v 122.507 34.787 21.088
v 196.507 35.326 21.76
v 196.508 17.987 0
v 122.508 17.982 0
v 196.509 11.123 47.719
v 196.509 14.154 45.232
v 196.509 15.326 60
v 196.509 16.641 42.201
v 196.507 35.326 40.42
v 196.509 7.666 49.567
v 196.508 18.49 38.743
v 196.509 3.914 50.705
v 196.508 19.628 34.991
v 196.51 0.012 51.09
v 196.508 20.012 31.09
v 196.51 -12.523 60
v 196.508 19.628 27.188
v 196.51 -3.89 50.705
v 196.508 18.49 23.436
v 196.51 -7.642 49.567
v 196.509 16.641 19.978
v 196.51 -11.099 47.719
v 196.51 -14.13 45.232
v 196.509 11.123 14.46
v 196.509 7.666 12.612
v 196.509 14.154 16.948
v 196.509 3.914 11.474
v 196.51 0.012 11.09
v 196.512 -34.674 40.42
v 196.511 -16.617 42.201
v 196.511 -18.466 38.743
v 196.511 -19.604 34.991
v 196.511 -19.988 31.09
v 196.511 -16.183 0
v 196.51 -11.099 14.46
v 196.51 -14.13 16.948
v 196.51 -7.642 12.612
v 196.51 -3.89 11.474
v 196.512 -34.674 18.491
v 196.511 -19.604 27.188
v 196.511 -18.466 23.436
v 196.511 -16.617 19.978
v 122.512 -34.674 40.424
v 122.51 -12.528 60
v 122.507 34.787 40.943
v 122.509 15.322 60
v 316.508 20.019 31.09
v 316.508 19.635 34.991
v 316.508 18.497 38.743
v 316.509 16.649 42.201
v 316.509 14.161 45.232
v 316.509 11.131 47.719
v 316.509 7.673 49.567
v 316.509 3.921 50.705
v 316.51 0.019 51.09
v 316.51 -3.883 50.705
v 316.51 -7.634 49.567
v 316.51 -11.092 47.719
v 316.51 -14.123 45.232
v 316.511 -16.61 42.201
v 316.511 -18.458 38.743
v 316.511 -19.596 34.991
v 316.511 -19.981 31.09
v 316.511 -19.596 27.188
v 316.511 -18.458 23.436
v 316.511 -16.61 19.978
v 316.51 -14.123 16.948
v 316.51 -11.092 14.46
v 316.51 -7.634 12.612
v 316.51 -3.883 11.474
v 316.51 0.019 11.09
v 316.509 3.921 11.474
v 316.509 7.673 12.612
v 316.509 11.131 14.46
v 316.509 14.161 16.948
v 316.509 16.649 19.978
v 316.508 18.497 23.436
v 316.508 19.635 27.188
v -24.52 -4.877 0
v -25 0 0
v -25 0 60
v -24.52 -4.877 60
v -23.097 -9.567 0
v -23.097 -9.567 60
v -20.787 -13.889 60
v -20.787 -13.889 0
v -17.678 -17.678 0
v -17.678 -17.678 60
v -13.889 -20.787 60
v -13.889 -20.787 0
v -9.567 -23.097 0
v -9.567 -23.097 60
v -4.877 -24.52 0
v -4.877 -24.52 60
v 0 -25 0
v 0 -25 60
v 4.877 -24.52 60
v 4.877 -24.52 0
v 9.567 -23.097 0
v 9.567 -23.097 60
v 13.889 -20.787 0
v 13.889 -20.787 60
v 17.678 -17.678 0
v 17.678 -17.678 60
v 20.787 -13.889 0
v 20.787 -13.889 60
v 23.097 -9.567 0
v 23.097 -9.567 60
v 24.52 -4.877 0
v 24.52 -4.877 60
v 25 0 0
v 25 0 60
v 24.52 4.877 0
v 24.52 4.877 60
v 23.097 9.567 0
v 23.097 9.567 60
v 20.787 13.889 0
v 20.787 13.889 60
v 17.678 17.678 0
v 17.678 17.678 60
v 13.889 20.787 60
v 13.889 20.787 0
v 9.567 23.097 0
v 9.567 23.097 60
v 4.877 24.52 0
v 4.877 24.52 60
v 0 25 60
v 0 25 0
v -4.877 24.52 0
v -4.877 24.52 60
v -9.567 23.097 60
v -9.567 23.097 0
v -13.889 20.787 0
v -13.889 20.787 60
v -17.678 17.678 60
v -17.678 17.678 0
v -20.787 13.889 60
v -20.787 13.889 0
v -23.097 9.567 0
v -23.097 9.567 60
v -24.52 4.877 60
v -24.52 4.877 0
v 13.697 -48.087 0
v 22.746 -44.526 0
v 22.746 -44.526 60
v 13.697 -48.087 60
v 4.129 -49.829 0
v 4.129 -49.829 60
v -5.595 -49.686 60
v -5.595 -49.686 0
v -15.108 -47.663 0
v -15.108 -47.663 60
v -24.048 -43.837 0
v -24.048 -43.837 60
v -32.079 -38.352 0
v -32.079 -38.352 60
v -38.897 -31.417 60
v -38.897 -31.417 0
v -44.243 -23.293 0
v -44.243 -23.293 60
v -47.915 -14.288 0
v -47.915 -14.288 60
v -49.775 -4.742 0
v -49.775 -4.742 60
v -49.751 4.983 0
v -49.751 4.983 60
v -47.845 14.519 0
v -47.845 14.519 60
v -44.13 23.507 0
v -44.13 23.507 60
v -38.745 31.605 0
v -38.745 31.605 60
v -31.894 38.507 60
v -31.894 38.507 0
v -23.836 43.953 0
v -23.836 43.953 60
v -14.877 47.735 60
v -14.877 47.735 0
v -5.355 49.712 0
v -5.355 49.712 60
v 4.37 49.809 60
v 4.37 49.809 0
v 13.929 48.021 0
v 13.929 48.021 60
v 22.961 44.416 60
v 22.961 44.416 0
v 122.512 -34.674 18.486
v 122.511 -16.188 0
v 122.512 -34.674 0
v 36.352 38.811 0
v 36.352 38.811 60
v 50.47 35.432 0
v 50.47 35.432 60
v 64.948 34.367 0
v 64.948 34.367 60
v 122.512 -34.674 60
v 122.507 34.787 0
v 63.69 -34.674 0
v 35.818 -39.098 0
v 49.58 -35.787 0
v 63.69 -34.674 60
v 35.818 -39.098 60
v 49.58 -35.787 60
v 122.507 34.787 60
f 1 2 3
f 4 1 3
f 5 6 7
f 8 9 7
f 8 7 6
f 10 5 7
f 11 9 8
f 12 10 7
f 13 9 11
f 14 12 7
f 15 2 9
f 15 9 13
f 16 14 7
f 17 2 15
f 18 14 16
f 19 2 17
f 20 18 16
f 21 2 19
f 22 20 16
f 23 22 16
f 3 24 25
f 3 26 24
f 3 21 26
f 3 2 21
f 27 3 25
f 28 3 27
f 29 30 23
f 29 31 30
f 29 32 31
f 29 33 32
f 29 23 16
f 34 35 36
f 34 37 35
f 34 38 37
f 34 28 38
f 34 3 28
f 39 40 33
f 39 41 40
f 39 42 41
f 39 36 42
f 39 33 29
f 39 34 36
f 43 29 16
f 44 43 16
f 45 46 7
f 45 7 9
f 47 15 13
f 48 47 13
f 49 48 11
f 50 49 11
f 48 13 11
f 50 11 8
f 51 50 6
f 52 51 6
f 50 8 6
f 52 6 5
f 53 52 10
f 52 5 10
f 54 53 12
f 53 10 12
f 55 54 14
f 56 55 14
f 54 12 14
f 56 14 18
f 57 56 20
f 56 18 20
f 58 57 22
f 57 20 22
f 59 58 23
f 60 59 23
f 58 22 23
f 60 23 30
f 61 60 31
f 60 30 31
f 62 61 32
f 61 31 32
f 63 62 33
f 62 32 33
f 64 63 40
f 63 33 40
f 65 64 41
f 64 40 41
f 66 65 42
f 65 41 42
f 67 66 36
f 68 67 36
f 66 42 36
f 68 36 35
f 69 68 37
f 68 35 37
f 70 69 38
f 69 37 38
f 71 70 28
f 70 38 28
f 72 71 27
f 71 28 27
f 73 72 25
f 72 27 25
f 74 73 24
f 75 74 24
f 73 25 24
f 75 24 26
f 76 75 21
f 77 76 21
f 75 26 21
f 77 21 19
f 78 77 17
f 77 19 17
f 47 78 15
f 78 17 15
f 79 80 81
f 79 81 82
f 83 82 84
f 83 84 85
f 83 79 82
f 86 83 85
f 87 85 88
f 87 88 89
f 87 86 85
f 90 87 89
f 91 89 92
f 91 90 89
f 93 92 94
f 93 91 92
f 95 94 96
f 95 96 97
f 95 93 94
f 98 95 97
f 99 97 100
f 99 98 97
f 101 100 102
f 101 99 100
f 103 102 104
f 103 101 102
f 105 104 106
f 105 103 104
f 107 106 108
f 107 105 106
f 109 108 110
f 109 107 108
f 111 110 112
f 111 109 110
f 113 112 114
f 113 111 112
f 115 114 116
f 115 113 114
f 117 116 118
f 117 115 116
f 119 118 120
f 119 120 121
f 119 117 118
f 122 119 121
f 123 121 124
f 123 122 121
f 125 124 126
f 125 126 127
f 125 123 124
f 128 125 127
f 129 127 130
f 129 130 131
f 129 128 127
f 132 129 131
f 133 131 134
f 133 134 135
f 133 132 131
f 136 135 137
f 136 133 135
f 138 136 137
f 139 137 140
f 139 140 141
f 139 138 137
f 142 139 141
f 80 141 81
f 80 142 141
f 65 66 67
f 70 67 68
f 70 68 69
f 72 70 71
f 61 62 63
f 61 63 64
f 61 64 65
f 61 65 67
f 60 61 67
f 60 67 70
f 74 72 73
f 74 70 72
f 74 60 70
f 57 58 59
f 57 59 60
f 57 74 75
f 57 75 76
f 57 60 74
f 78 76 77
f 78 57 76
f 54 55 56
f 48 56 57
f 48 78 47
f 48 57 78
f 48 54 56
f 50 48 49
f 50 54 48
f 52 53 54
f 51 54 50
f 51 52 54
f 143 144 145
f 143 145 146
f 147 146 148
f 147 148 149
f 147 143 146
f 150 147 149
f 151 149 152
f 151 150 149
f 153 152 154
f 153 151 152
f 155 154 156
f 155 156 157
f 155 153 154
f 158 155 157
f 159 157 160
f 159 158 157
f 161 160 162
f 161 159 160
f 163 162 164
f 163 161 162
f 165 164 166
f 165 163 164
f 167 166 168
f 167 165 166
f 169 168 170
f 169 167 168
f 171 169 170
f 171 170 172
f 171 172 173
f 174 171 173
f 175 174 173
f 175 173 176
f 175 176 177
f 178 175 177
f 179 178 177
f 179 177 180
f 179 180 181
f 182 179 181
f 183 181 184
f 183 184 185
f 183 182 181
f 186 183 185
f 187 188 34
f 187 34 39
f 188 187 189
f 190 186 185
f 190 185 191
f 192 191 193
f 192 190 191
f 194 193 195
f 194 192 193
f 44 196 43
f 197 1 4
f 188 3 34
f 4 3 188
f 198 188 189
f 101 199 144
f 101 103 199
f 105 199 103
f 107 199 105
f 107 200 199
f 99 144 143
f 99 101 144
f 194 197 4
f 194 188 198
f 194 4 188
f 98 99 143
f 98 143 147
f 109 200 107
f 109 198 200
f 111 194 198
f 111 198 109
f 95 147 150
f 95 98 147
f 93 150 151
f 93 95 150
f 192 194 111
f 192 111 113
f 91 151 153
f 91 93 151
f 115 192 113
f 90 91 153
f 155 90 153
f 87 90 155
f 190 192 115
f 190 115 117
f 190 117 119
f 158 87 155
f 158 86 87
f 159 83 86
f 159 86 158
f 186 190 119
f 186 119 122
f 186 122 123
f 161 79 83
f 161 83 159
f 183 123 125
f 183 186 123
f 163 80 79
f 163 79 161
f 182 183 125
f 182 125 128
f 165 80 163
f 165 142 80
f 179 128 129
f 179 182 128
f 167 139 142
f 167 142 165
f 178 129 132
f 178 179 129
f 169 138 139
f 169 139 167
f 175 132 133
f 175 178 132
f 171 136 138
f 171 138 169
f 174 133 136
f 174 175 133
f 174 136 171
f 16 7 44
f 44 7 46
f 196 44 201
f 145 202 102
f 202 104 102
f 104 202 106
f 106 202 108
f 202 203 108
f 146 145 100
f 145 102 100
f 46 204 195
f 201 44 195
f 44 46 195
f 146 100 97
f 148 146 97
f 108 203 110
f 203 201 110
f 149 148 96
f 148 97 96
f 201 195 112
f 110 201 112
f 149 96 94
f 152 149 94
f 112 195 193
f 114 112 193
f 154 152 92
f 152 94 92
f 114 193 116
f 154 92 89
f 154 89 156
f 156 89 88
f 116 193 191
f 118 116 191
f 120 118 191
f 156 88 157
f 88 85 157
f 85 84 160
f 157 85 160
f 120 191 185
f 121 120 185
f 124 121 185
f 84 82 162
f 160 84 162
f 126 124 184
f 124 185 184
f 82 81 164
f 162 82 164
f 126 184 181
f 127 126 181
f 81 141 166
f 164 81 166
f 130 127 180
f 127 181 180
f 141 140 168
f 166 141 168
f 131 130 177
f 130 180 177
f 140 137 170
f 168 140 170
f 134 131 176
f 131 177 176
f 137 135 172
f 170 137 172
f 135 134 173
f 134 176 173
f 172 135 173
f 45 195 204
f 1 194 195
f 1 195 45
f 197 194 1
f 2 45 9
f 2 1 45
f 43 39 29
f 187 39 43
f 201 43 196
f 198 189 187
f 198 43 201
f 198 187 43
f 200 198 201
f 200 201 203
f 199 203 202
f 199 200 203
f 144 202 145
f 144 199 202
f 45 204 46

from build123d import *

# Parameters (mm, degrees)
SKETCH1_R           = 25
BOSS_EXTRUDE1_DEPTH = 60
CUT_EXTRUDE1_DEPTH  = 74
SKETCH3_R           = 20
BOSS_EXTRUDE2_DEPTH = 120


with BuildPart() as part:
    # Sketch1 → Boss-Extrude1 (new body)
    with BuildSketch(Plane.XY):
        with BuildLine():
            Line((64.94754869, 34.367143049), (196.507423933, 35.326035965))
            Line((196.507423933, 35.326035965), (196.511673709, -34.673963906))
            Line((196.511673709, -34.673963906), (63.689894991, -34.673963906))
            ThreePointArc((63.689894991, -34.673963906), (42.633771657, -37.171737248), (22.746391068, -44.526415681))
            ThreePointArc((22.746391068, -44.526415681), (-49.999854067, 0.120802809), (22.961281527, 44.415983054))
            ThreePointArc((22.961281527, 44.415983054), (43.342950879, 36.836730802), (64.94754869, 34.367143049))
        make_face()
        with Locations(Location((0, 0, 0), (0, 0, 180))):
            Circle(SKETCH1_R, mode=Mode.SUBTRACT)
    extrude(amount=BOSS_EXTRUDE1_DEPTH)

    # Sketch2 → Cut-Extrude1 (cut)
    with BuildSketch(Plane(origin=(196.509567891, 0.011930308, 0), x_dir=(0, 0, -1), z_dir=(0.9999999981570824, 6.0711079910172726e-05, 0))):
        Polygon((-60, 15.314105722), (-40.419671978, 35.314105722), (-60, 35.314105722), align=None)
        Polygon((0, 35.314105722), (-21.759605821, 35.314105722), (0, 17.974594403), align=None)
        Polygon((-40.419671978, -34.685894278), (-60, -12.535294787), (-60, -34.685894278), align=None)
        Polygon((0, -34.685894278), (0, -16.195205155), (-18.490689122, -34.685894278), align=None)
    extrude(amount=-CUT_EXTRUDE1_DEPTH, mode=Mode.SUBTRACT)

    # Sketch3 → Boss-Extrude2 (add)
    with BuildSketch(Plane(origin=(196.509567891, 0.011930308, 0), x_dir=(0, 0, -1), z_dir=(0.9999999981570824, 6.0711079910172726e-05, 0))):
        with Locations(Location((-31.0896389, 0, 0), (0, 0, 90))):
            Circle(SKETCH3_R)
    extrude(amount=BOSS_EXTRUDE2_DEPTH)


solid = part.part
